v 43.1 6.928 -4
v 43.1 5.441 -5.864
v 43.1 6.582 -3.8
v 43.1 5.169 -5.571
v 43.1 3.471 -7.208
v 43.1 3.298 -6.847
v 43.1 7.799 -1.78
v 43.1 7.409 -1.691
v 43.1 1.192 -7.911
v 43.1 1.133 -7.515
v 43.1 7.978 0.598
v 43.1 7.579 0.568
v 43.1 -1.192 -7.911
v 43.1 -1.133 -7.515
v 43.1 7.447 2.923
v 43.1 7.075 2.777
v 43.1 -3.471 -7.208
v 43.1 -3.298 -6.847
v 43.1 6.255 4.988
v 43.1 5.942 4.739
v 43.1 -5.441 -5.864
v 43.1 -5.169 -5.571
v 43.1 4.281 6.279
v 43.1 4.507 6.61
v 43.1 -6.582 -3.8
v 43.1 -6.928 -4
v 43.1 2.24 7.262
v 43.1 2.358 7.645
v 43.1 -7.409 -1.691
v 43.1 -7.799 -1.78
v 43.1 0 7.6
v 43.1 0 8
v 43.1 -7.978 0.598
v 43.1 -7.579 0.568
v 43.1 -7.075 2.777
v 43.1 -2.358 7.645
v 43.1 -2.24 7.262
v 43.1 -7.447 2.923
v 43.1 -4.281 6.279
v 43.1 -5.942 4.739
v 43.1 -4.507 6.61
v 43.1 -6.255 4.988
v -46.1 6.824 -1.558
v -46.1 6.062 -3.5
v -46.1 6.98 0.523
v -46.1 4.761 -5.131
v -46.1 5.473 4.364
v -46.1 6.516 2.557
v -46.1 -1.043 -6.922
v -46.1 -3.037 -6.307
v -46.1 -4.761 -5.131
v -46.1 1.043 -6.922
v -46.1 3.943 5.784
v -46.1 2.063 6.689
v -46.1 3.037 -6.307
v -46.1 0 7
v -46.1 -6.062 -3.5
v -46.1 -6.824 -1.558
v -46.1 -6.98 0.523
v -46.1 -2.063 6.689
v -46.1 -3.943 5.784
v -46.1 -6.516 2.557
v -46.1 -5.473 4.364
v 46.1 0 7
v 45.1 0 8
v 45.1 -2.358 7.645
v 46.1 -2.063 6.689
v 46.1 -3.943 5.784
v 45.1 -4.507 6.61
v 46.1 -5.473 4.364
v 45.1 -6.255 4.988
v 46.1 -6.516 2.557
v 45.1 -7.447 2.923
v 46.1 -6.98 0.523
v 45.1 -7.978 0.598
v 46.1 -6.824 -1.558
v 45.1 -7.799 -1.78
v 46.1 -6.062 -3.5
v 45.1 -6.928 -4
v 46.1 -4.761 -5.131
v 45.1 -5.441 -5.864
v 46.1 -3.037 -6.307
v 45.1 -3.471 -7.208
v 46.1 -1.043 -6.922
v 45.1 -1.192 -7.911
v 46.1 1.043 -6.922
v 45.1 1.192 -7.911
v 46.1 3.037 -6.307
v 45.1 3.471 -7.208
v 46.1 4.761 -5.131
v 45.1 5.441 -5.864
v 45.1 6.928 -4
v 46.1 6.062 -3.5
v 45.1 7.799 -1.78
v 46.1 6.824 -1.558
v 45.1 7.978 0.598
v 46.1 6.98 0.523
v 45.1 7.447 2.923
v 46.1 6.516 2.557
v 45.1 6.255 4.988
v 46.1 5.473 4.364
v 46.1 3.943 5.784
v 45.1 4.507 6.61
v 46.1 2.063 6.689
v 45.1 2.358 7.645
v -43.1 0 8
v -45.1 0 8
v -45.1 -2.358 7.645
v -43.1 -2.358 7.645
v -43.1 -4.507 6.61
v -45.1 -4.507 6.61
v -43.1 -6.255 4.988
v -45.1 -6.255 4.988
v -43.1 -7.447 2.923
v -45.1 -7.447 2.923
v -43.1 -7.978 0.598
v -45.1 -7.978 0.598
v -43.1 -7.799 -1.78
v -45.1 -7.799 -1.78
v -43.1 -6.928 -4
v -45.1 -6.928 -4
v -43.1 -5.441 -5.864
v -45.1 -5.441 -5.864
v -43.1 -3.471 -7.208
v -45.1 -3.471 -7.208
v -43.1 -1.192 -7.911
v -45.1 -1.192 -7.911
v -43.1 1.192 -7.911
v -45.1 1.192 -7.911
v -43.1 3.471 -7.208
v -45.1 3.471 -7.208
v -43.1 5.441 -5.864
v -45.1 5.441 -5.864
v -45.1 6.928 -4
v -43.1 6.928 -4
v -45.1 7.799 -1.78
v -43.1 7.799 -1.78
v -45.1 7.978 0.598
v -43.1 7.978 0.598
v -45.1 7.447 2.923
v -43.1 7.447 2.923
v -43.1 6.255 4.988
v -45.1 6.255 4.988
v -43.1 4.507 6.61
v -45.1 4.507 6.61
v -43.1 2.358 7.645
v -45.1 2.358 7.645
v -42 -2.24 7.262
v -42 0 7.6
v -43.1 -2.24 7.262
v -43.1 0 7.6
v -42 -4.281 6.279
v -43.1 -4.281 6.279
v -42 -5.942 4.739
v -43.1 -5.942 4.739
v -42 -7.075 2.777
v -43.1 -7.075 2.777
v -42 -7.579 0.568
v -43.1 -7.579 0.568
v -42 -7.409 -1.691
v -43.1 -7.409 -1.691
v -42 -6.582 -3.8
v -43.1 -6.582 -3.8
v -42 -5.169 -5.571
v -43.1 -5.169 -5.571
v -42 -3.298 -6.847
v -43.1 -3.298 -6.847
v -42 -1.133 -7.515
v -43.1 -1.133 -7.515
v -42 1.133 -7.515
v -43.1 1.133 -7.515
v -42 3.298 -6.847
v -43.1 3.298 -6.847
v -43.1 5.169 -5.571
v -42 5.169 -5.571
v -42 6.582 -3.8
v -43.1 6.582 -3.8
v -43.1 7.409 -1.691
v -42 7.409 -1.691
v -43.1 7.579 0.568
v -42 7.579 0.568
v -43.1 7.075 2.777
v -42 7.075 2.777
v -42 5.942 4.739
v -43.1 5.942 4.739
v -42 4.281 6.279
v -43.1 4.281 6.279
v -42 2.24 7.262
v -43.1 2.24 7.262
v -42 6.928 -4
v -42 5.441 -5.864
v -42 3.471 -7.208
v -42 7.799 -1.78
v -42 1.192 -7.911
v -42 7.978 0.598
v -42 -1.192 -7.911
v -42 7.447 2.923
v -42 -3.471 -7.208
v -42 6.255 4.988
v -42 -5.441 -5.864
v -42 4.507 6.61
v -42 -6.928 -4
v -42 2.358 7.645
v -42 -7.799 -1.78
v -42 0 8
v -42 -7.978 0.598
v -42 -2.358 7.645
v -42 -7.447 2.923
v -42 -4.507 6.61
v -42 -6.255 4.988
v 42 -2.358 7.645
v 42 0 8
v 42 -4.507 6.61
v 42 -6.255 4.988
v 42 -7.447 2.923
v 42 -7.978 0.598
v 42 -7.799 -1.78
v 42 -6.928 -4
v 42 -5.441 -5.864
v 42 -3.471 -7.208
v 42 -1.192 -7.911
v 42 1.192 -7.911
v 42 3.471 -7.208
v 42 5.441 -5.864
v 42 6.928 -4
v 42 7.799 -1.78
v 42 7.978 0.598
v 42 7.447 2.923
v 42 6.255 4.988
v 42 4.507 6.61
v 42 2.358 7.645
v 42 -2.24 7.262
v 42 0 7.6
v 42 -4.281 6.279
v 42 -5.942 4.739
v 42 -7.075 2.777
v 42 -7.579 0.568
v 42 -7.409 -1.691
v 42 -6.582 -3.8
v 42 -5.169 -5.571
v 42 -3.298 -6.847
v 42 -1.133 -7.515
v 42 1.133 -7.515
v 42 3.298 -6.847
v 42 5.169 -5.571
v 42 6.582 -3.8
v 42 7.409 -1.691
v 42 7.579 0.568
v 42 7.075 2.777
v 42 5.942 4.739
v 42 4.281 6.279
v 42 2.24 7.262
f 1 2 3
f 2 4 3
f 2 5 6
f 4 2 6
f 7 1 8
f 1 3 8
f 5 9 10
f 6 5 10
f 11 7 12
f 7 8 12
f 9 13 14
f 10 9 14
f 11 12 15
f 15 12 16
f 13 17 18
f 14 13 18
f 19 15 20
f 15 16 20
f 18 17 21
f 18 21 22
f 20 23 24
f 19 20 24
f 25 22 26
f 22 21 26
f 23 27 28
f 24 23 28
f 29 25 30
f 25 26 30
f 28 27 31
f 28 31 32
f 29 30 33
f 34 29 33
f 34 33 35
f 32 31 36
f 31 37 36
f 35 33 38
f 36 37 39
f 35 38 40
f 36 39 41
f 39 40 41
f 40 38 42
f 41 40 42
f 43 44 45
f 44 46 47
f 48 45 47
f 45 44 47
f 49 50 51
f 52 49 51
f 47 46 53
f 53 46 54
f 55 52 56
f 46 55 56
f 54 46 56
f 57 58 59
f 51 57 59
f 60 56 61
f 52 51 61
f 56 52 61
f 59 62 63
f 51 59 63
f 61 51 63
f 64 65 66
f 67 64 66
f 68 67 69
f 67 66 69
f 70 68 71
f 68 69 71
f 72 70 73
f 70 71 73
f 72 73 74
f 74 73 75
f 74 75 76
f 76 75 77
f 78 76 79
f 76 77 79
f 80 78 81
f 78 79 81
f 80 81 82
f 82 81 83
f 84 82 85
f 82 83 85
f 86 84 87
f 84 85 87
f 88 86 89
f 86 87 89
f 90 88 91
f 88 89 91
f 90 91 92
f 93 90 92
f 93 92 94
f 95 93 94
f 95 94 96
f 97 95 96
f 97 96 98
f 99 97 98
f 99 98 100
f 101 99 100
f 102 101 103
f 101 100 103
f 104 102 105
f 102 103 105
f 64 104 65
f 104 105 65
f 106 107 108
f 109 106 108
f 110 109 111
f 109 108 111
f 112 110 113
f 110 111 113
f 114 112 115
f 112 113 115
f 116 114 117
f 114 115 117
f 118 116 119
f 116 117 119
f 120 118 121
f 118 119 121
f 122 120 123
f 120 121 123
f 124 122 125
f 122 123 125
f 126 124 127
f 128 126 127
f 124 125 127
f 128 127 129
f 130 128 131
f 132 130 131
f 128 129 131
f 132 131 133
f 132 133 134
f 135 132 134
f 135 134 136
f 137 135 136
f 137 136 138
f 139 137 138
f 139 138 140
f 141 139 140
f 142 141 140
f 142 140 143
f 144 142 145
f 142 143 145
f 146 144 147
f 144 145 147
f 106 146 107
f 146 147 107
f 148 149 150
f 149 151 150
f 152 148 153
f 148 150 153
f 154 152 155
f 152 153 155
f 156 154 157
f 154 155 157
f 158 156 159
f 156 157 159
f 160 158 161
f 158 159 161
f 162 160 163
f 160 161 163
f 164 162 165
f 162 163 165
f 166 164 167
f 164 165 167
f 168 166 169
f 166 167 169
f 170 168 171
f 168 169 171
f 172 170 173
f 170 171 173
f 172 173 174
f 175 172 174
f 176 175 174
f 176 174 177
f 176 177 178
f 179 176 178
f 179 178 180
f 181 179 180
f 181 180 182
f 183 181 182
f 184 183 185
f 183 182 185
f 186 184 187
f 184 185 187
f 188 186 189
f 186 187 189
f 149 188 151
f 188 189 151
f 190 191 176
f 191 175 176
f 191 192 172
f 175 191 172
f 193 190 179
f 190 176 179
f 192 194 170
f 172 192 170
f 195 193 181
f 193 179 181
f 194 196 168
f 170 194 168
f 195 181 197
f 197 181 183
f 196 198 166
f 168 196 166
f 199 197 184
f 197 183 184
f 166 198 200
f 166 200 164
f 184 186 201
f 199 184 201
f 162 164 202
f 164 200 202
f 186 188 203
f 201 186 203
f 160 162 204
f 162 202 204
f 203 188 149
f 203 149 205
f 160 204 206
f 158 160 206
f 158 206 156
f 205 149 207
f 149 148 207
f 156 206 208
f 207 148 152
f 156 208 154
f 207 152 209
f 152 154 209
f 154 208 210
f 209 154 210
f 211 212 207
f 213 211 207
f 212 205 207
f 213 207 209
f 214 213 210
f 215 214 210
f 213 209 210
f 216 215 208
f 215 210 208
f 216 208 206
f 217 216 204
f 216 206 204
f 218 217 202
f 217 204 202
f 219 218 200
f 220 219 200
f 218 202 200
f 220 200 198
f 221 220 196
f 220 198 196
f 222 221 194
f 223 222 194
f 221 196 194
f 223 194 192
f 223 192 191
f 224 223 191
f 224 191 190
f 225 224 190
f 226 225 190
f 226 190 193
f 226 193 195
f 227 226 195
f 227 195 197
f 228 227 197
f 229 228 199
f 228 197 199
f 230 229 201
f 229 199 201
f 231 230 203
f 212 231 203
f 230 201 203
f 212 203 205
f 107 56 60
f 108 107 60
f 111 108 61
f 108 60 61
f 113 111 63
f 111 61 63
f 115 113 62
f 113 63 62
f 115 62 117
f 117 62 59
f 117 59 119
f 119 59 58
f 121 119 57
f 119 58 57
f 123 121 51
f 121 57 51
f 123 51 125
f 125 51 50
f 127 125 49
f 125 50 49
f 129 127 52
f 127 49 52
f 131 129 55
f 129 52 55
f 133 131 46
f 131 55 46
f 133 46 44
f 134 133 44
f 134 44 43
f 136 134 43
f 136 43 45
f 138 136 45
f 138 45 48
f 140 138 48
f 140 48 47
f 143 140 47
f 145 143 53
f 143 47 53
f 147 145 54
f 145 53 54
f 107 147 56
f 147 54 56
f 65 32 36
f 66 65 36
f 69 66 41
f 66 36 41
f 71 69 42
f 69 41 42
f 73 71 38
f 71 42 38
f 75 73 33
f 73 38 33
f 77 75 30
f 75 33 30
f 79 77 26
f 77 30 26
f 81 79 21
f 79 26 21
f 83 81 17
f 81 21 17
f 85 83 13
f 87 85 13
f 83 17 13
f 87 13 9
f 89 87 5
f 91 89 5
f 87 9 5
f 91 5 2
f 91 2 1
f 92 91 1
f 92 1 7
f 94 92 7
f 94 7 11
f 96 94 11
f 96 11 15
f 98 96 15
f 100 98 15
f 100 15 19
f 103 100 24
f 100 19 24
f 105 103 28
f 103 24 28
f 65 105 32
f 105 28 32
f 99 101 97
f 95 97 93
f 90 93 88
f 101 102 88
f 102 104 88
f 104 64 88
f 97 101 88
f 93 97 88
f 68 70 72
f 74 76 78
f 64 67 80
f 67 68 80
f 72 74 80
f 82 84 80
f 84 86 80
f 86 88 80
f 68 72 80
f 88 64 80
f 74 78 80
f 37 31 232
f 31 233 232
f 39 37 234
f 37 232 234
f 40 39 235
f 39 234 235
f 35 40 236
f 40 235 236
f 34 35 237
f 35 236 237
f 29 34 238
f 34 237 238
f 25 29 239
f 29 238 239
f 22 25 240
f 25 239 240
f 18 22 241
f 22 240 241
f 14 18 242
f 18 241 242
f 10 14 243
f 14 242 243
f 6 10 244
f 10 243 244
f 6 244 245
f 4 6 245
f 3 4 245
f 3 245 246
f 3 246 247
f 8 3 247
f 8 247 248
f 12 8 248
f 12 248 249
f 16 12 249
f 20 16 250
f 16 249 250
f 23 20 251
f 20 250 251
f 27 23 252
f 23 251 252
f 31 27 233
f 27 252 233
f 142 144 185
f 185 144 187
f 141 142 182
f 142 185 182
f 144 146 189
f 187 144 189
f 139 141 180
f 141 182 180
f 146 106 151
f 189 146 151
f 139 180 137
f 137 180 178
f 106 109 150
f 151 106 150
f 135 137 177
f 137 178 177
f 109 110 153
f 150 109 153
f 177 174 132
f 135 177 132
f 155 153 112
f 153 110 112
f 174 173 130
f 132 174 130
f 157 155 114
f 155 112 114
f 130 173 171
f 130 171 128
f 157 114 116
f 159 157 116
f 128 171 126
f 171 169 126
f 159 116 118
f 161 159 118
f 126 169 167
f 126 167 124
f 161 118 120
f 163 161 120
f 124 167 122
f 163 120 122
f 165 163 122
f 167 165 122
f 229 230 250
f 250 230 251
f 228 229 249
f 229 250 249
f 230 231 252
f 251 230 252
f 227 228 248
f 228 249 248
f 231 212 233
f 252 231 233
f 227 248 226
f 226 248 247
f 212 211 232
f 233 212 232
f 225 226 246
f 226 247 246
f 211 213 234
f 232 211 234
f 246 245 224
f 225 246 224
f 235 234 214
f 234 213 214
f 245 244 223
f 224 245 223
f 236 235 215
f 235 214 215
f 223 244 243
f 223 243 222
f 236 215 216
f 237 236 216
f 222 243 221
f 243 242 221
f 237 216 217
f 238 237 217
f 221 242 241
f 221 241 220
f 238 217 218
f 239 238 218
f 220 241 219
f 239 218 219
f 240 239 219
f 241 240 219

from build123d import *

# Parameters (mm, degrees)
F2_SIZE = 1


with BuildPart() as f1:
    # F0 (on Front) → F1 (revolve)
    with BuildSketch(Plane.XZ):
        Polygon((42, 8), (0, 8), (-42, 8), (-42, 7.6), (-43.1, 7.6), (-43.1, 8), (-46.1, 8), (-46.1, 0), (46.1, 0), (46.1, 8), (43.1, 8), (43.1, 7.6), (42, 7.6), align=None)
    revolve(axis=Axis((0, 0, 0), (1, 0, 0)))

    # F2
    f2_edges = [f1.edges().sort_by_distance(p)[0] for p in [
        (-46.1, 0, -8),
        (46.1, 0, -8),
    ]]
    chamfer(f2_edges, length=F2_SIZE)


solid = f1.part
